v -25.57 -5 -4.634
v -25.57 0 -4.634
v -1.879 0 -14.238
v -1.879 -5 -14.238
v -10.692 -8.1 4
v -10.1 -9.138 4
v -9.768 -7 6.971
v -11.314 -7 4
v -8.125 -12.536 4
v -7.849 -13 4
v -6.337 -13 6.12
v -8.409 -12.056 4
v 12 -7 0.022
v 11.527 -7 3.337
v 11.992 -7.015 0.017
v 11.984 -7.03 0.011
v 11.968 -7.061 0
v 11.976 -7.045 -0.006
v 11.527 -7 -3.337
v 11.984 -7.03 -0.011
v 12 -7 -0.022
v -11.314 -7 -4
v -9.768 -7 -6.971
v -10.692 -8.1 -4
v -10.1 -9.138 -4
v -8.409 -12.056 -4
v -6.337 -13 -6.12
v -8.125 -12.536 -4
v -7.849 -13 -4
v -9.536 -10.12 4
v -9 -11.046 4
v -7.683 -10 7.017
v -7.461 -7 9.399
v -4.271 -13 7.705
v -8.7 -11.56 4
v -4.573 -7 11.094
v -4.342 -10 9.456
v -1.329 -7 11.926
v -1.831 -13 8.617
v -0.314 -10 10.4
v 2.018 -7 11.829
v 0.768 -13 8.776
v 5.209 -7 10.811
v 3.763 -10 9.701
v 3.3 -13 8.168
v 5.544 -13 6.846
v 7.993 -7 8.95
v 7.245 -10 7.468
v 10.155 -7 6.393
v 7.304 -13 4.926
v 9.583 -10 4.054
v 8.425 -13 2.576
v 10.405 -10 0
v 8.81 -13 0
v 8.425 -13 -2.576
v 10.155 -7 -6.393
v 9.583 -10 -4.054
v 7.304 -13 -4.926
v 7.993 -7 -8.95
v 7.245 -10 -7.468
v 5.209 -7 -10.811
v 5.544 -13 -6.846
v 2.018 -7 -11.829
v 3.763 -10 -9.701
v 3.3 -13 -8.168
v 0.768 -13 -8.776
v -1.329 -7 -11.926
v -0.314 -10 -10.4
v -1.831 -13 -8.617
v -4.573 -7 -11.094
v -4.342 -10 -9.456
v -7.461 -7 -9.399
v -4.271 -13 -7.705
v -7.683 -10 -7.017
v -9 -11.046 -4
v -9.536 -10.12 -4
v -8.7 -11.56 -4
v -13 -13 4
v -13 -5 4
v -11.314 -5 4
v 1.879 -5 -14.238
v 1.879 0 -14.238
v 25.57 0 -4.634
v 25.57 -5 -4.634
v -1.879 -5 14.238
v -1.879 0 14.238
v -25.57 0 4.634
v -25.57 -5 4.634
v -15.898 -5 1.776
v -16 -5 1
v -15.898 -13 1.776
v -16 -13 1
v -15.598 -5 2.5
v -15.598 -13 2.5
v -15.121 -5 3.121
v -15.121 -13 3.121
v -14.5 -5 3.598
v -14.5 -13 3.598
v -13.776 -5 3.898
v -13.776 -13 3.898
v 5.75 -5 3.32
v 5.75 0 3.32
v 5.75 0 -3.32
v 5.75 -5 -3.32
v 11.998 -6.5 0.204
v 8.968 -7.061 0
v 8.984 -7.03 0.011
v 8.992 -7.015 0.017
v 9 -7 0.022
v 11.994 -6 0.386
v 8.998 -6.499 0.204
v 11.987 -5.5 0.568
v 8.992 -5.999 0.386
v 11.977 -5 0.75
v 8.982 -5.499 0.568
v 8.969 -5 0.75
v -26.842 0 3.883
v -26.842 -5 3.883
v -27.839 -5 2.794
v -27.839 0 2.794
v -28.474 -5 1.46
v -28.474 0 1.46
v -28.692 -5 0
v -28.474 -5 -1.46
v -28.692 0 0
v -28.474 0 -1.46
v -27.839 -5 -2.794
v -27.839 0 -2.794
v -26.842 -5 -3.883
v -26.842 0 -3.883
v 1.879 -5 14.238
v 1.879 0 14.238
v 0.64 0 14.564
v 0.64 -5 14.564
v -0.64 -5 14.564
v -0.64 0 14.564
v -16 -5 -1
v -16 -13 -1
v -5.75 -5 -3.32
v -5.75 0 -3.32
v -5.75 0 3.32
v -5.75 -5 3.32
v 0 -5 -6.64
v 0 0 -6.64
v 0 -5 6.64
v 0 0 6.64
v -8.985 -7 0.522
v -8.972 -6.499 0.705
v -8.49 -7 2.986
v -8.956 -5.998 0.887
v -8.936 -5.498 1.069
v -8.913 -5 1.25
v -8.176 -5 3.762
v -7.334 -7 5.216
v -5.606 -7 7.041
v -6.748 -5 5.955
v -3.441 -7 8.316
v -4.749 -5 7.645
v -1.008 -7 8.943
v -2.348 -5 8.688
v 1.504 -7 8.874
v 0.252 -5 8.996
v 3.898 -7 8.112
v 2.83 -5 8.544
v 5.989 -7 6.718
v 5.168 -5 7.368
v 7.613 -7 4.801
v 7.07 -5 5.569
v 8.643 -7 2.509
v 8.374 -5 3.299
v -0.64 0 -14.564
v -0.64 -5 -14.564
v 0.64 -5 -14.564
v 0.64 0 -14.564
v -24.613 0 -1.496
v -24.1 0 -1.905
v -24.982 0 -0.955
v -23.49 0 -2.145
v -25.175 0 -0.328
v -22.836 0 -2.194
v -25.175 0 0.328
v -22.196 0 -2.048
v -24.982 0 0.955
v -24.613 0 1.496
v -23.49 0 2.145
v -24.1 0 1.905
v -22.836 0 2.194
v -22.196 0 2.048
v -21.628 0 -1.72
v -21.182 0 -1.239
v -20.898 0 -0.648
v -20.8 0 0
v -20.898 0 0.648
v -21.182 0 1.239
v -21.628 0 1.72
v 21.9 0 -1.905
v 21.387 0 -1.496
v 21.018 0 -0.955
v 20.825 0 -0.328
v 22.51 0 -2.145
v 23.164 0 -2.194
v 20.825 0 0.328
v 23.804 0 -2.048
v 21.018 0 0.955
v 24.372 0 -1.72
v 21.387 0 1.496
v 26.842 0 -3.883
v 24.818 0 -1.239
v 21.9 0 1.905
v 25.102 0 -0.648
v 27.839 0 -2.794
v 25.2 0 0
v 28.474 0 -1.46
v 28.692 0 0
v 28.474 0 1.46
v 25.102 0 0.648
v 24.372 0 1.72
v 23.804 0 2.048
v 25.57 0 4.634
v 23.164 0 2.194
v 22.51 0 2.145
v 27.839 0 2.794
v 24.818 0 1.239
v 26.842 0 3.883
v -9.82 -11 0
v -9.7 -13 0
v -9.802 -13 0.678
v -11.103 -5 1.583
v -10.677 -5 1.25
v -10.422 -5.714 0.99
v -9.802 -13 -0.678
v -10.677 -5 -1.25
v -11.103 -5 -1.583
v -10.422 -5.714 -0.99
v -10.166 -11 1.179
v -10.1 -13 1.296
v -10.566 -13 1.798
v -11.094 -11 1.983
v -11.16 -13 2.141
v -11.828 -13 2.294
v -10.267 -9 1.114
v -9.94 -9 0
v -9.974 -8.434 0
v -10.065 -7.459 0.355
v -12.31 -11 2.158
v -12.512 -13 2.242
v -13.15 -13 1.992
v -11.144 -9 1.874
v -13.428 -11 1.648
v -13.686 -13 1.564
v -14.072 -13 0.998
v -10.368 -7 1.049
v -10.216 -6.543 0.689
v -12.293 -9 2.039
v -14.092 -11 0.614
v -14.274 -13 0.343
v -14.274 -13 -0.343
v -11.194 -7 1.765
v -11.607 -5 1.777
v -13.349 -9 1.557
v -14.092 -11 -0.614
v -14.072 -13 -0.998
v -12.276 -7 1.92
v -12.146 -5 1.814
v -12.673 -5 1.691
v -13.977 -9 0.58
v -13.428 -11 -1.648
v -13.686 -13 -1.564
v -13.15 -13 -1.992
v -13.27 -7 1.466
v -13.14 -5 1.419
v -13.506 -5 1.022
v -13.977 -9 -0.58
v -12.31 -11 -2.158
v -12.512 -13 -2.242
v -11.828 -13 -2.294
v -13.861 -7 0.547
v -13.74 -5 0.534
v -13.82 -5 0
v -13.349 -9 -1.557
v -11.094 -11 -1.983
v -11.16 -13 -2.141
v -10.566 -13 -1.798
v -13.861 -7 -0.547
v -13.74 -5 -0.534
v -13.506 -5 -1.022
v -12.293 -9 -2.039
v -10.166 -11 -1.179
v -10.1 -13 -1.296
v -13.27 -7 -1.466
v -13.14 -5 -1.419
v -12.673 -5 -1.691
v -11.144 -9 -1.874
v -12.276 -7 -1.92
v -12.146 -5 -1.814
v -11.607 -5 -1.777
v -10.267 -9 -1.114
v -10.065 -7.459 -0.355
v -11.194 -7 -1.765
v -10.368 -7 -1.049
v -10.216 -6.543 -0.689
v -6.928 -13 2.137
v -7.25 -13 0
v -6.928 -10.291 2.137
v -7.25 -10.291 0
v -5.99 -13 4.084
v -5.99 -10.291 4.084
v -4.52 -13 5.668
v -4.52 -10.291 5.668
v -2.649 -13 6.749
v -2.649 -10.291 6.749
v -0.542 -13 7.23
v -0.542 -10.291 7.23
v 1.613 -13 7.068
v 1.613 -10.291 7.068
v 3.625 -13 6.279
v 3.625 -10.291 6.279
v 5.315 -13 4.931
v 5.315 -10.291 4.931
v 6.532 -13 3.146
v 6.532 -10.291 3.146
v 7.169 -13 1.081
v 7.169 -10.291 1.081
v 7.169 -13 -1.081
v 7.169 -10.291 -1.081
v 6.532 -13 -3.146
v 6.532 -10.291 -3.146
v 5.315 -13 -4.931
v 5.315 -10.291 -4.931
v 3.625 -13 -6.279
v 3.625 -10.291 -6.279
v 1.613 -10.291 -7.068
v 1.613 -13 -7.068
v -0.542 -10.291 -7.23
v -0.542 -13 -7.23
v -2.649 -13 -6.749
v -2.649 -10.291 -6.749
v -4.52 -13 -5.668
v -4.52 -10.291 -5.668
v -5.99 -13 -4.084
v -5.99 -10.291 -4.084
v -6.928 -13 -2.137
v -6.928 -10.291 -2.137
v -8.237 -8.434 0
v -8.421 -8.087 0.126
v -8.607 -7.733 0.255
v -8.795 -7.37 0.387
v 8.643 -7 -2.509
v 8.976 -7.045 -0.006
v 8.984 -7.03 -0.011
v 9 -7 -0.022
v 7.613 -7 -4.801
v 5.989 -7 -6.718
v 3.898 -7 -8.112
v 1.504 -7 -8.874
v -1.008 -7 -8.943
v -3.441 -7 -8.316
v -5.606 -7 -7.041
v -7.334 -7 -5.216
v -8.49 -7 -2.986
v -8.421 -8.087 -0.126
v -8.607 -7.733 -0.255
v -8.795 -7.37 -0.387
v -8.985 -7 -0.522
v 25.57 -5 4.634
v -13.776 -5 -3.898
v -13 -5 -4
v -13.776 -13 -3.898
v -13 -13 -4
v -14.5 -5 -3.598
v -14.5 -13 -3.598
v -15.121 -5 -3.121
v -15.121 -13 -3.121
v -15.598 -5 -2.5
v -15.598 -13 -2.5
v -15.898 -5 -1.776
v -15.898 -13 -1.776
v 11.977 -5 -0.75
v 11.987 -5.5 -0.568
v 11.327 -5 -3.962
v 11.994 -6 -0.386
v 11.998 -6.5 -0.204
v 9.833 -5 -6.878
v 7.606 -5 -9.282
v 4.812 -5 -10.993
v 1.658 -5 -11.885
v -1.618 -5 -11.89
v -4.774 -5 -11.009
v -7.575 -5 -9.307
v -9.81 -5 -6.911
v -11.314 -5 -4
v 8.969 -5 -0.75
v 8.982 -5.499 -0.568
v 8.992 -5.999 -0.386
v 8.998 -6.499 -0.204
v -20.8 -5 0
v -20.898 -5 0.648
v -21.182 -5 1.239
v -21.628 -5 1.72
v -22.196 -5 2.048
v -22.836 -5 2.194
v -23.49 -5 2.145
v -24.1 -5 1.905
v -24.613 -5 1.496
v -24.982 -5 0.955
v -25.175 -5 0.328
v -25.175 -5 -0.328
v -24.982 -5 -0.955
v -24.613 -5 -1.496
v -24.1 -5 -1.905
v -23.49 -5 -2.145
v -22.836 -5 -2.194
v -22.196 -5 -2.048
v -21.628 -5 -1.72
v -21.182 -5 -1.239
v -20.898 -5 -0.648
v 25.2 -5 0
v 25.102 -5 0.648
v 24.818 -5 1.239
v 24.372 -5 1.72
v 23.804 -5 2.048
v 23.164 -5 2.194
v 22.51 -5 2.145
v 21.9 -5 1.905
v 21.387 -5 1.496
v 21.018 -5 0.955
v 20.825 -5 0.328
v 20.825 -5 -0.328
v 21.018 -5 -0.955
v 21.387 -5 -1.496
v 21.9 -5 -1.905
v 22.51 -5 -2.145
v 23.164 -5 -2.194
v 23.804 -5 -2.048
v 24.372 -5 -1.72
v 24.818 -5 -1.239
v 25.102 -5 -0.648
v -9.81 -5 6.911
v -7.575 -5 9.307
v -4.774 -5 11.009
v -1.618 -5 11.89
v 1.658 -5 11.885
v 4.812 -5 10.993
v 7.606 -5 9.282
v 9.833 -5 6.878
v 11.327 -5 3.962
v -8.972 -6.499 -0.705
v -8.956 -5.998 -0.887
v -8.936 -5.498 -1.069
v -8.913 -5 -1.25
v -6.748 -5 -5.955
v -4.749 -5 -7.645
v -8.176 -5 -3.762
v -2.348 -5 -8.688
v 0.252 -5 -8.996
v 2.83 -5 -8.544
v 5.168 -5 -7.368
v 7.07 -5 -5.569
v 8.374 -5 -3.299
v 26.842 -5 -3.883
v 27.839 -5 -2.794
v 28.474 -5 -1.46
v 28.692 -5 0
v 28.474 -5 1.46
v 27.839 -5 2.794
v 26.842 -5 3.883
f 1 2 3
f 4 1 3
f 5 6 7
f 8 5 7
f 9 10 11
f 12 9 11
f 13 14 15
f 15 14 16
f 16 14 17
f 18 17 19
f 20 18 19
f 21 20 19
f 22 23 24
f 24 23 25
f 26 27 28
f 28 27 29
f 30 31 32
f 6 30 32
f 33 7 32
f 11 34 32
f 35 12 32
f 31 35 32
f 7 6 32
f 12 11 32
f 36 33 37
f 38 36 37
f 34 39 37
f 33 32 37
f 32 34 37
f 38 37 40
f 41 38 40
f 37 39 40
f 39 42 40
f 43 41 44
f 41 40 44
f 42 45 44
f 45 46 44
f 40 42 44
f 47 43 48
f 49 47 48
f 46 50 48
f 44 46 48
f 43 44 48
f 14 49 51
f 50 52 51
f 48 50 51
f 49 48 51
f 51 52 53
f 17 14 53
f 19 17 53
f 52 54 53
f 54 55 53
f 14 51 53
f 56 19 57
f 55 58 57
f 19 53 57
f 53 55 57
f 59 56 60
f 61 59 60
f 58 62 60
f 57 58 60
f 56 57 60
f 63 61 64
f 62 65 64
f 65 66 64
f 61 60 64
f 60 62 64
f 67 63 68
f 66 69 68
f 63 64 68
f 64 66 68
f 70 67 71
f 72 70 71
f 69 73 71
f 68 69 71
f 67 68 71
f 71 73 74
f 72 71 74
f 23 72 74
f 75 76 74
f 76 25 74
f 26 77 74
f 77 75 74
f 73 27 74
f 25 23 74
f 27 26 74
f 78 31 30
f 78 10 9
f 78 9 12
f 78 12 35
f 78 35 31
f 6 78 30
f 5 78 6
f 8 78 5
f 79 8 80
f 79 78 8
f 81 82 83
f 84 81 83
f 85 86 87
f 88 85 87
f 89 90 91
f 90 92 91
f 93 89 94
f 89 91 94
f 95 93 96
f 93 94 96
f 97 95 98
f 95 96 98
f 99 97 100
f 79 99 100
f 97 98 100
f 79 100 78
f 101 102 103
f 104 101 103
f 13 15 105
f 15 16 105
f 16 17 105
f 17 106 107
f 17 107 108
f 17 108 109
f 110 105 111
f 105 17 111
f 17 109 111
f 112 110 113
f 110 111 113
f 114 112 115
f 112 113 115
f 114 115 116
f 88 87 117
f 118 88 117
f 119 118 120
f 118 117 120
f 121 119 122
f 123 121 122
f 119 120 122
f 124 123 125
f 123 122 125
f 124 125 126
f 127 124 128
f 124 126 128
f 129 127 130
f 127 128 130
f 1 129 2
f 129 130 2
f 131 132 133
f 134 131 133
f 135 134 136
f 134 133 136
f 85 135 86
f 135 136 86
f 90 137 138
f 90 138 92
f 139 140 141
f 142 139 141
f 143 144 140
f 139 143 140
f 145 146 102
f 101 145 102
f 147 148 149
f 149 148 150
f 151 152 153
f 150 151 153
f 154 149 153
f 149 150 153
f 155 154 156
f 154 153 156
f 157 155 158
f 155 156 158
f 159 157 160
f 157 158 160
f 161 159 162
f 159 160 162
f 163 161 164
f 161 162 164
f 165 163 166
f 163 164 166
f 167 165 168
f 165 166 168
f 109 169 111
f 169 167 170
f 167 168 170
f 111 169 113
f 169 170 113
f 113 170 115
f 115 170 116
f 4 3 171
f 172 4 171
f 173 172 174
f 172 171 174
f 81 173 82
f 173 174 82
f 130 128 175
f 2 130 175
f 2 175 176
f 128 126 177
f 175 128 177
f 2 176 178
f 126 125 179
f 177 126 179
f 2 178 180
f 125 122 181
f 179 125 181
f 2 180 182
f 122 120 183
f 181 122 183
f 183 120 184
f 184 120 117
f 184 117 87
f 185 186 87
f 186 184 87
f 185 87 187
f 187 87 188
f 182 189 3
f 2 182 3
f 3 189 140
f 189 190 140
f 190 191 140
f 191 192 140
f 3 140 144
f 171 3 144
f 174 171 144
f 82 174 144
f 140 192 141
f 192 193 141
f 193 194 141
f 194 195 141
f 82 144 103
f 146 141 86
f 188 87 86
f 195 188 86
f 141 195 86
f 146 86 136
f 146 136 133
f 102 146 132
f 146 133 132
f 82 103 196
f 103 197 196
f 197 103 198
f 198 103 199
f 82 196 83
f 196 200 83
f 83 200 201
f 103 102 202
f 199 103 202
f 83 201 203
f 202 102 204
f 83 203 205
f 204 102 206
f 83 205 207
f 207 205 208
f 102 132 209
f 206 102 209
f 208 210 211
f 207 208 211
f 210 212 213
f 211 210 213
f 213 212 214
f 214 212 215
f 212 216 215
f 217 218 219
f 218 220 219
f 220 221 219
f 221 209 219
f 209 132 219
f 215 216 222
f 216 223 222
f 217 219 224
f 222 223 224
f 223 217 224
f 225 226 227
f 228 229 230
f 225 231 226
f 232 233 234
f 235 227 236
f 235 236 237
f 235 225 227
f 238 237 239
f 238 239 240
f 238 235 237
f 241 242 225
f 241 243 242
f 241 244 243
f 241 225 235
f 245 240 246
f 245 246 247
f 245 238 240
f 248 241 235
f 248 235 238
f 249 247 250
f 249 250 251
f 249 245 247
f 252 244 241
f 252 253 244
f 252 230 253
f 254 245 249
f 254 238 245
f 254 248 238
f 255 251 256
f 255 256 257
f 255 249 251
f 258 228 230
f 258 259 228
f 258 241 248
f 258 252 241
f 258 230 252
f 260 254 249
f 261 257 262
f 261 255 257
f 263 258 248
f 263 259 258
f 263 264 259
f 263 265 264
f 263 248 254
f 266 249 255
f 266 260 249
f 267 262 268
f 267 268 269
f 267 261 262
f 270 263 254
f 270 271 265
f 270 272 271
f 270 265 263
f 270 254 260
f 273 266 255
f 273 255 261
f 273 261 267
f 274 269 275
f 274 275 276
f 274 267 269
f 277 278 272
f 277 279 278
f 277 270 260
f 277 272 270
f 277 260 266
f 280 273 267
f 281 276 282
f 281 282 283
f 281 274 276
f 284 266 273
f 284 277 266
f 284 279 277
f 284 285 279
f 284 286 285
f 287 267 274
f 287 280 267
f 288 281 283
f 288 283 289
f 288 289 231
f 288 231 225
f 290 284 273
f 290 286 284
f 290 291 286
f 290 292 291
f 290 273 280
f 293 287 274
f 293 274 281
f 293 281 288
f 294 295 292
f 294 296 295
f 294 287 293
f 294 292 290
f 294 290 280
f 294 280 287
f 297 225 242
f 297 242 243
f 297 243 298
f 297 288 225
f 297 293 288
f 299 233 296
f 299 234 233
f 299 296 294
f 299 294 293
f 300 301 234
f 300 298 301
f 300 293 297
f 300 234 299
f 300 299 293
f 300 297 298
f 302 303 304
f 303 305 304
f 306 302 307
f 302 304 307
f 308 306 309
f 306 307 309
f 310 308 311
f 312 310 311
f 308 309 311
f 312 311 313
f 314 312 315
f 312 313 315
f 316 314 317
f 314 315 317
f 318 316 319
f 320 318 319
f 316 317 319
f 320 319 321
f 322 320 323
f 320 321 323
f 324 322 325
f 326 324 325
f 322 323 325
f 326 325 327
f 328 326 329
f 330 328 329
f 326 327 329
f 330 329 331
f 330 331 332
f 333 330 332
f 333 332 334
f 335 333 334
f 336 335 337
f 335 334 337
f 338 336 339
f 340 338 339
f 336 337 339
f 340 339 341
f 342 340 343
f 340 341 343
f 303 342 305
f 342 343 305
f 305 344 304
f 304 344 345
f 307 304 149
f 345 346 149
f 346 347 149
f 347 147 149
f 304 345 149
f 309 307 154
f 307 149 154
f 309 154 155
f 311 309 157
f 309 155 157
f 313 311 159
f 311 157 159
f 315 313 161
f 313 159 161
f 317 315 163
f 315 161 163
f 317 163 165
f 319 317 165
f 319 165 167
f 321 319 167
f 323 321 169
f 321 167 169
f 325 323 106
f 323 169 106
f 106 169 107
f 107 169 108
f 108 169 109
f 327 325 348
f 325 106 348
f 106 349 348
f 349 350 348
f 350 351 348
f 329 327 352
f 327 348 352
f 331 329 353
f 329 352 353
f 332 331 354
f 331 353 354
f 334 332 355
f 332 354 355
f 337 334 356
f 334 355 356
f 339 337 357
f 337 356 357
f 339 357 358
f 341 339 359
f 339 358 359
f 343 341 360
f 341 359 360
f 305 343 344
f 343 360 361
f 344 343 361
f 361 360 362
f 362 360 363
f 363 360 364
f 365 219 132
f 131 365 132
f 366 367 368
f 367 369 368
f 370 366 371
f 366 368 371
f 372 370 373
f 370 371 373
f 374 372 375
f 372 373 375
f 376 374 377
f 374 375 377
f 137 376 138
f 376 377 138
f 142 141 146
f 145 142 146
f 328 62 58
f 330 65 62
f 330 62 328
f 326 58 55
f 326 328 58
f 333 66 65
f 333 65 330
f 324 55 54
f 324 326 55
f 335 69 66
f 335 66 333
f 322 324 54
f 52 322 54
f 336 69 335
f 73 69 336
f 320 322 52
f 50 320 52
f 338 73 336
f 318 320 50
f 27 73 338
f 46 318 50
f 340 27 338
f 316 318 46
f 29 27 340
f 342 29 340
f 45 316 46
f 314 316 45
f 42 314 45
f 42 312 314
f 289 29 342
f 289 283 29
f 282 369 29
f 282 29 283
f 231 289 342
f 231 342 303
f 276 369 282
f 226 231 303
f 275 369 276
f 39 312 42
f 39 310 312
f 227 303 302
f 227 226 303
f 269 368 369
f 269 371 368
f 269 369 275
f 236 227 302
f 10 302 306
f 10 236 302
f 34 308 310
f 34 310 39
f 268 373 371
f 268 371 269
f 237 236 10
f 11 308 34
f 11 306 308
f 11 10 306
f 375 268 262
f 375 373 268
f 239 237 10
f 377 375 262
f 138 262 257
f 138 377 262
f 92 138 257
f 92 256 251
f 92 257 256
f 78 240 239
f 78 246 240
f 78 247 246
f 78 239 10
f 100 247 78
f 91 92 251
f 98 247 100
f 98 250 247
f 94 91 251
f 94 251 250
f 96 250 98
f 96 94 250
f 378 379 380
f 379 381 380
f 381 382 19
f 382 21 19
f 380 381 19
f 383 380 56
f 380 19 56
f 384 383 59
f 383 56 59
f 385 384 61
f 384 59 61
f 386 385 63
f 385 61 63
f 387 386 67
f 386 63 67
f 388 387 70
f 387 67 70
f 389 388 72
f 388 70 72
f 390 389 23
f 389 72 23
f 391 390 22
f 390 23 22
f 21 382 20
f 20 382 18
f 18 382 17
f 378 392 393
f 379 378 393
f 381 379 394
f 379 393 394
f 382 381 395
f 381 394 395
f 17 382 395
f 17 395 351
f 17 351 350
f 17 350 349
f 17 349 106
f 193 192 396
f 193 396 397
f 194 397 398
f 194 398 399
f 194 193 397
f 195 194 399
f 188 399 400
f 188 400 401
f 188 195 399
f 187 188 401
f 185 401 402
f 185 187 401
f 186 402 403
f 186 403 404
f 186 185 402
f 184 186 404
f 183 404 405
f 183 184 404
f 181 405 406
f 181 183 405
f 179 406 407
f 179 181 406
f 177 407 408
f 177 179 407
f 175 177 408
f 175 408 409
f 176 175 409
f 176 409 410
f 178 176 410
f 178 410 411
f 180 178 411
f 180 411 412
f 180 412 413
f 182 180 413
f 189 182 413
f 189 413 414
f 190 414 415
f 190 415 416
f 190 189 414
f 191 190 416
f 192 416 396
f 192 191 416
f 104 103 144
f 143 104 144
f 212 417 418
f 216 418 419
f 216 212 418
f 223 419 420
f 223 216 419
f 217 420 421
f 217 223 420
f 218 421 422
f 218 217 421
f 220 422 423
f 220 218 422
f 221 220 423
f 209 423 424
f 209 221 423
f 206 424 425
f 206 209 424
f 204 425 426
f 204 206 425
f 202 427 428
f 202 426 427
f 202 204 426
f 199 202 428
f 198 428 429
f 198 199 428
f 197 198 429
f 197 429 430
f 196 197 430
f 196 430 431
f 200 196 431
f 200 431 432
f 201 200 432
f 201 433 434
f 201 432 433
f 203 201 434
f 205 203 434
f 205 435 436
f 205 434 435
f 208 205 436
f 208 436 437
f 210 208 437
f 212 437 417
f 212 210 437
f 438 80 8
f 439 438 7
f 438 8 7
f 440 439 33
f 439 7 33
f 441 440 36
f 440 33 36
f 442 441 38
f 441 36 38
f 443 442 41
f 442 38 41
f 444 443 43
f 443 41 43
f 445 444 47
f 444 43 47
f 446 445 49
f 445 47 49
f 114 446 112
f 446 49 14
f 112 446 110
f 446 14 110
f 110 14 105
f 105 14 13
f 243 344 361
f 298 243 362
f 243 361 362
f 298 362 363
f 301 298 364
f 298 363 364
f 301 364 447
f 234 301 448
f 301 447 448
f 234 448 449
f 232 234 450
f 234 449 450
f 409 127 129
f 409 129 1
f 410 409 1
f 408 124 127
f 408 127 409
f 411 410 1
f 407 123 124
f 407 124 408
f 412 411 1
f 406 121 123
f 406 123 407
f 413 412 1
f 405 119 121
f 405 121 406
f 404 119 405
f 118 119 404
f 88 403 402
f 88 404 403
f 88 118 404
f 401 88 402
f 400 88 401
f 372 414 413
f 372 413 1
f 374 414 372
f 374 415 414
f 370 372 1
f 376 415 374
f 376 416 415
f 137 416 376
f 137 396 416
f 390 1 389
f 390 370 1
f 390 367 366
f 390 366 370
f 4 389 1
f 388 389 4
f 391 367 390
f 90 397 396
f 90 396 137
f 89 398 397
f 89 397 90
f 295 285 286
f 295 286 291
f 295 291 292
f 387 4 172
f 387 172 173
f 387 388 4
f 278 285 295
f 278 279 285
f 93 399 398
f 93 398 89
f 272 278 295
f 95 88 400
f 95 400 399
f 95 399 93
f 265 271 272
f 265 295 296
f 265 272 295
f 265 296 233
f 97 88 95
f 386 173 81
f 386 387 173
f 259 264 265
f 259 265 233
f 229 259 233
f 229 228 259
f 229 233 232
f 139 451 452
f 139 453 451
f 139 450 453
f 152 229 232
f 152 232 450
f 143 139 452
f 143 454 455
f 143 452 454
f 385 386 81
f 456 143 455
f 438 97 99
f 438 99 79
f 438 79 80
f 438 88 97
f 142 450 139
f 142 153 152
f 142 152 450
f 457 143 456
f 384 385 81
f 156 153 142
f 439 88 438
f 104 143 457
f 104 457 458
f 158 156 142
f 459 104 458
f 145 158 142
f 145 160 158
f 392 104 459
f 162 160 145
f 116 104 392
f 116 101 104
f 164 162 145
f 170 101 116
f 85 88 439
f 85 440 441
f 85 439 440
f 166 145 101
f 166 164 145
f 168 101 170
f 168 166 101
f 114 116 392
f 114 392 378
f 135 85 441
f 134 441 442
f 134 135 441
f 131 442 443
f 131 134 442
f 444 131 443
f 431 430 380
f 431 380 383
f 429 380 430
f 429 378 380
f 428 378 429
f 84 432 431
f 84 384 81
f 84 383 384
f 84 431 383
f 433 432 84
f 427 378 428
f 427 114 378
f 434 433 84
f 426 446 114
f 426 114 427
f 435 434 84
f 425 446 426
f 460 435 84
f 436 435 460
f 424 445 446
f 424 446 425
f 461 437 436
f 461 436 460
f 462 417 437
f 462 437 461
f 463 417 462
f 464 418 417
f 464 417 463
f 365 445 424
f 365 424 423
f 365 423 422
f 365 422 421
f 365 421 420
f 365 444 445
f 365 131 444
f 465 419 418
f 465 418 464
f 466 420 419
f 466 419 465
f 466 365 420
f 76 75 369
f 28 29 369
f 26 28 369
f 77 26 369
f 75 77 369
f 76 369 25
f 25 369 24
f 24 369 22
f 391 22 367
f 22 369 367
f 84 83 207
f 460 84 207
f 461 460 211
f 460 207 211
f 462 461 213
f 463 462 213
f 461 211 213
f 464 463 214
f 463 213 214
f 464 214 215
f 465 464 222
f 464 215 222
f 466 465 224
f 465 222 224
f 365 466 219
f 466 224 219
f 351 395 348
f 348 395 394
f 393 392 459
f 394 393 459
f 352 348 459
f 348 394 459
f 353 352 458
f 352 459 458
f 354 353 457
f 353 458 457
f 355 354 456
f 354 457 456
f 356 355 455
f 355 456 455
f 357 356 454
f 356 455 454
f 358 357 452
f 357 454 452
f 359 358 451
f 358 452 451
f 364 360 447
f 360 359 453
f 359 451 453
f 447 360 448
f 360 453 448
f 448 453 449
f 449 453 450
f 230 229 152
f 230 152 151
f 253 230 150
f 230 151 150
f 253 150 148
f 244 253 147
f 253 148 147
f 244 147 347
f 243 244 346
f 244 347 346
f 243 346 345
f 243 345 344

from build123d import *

# Parameters (mm, degrees)
F0_R      = 2.2
F1_DEPTH  = 5
F5_W      = 7
F5_H      = 8
F6_DEPTH  = 8
F10_DEPTH = 7
F12_DEPTH = 22.94269
F13_W     = 1.95429
F13_H     = 8
F14_DEPTH = 1.5
F15_R     = 3
F16_R     = 3


with BuildPart() as f1:
    # F0 (on Front) → F1 (new body)
    with BuildSketch(Plane.XZ):
        with BuildLine():
            Line((-1.878526, 14.238436), (-25.570216, 4.633696))
            ThreePointArc((-25.570216, 4.633696), (-28.69169, 0), (-25.570216, -4.633696))
            Line((-25.570216, -4.633696), (-1.878526, -14.238436))
            ThreePointArc((-1.878526, -14.238436), (0, -14.604739), (1.878526, -14.238436))
            Line((1.878526, -14.238436), (25.570216, -4.633696))
            ThreePointArc((25.570216, -4.633696), (28.69169, 0), (25.570216, 4.633696))
            Line((25.570216, 4.633696), (1.878526, 14.238436))
            ThreePointArc((1.878526, 14.238436), (0, 14.604739), (-1.878526, 14.238436))
        make_face()
        with Locations((-23, 0)):
            Circle(F0_R, mode=Mode.SUBTRACT)
        Polygon((0, 6.639528), (5.75, 3.319764), (5.75, -3.319764), (0, -6.639528), (-5.75, -3.319764), (-5.75, 3.319764), align=None, mode=Mode.SUBTRACT)
        with Locations((23, 0)):
            Circle(F0_R, mode=Mode.SUBTRACT)
    extrude(amount=F1_DEPTH)

    # F3 (on Top) → F4 (revolve)
    with BuildSketch(Plane.XY):
        Polygon((-9, 0), (-12, 0), (-12, -7), (-8.809743, -13), (-7.25, -13), (-7.25, -10.291271), (-9, -7), align=None)
    revolve(axis=Axis((0, -6.211402, 0), (0, 1, 0)))

    # F5 (on face) → F6 (join)
    with BuildSketch(Plane.XZ.offset(5)):
        with Locations((-12.5, 0)):
            Rectangle(F5_W, F5_H)
    extrude(amount=F6_DEPTH)

    # F7 (on Top) → F8 (revolve, cut)
    with BuildSketch(Plane.XY):
        Polygon((-12, -13), (-9.7, -13), (-10.18, -5), (-12, -5), align=None)
    revolve(axis=Axis((-12, -9.796117, 0), (0, -1, 0)), mode=Mode.SUBTRACT)

    # F9 (on face) → F10 (cut)
    with BuildSketch(Plane.YZ.offset(-5.75)):
        Polygon((-8.434347, 0), (-5, -1.25), (-5, 1.25), align=None)
    extrude(amount=-F10_DEPTH, mode=Mode.SUBTRACT)

    # F11 (on face) → F12 (cut, through all)
    with BuildSketch(Plane(origin=(5.75, 0, 0), x_dir=(0, -1, 0), z_dir=(-1, 0, 0))):
        Polygon((7.060608, 0), (5, 0.75), (5, -0.75), align=None)
    extrude(amount=-F12_DEPTH, mode=Mode.SUBTRACT)

    # F13 (on face) → F14 (join)
    with BuildSketch(Plane.YZ.offset(-9)):
        with Locations((-12.022855, 0)):
            Rectangle(F13_W, F13_H)
    extrude(amount=F14_DEPTH)

    # F15
    f15_edges = [f1.edges().sort_by_distance(p)[0] for p in [
        (-16, -9, -4),
    ]]
    fillet(f15_edges, radius=F15_R)

    # F16
    f16_edges = [f1.edges().sort_by_distance(p)[0] for p in [
        (-16, -9, 4),
    ]]
    fillet(f16_edges, radius=F16_R)


solid = f1.part
